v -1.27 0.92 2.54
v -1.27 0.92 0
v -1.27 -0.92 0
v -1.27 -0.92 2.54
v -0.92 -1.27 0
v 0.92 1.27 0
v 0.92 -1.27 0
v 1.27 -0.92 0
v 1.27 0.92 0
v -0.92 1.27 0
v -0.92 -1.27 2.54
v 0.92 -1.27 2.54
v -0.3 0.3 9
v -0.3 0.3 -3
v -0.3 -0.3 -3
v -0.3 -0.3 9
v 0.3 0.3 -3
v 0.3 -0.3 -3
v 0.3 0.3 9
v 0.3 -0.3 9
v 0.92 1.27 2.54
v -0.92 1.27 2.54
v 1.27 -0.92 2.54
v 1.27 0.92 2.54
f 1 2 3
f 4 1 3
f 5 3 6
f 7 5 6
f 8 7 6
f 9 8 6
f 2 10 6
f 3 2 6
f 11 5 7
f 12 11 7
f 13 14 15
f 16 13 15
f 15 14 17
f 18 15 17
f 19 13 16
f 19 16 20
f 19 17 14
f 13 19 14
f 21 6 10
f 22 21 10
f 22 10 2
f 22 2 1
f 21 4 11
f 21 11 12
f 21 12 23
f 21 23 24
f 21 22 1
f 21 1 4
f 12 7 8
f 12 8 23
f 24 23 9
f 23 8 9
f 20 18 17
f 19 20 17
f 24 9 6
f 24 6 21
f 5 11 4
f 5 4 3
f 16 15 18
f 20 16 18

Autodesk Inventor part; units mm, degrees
ref_plane "YZ Plane" through (0, 0, 0) normal (1, 0, 0) x (0, 1, 0)
ref_plane "XZ Plane" through (0, 0, 0) normal (0, 1, 0) x (-1, 0, 0)
ref_plane "XY Plane" through (0, 0, 0) normal (0, 0, 1) x (1, 0, 0)
sketch "Skizze1" plane through (0, 0, 0) normal (0, 0, 1) x (1, 0, 0)
  line L0 (-1.27, -1.27) -> (1.27, -1.27)
  line L1 (1.27, -1.27) -> (1.27, 1.27)
  line L2 (1.27, 1.27) -> (-1.27, 1.27)
  line L3 (-1.27, 1.27) -> (-1.27, -1.27)
  line L4 (-1.27, -1.27) -> (1.27, 1.27) construction
  line L5 (1.27, -1.27) -> (-1.27, 1.27) construction
  point P0 (0, 0)
  dimension "d0" = 2.54
  dimension "d1" = 2.54
extrude "Extrusion1" add sketch "Skizze1" along normal blind 2.54
chamfer "Fase1" distance 0.35 angle 45 4 edges at (1.27, -1.27, 1.27) (-1.27, -1.27, 1.27) (-1.27, 1.27, 1.27) (1.27, 1.27, 1.27)
sketch "Skizze2" plane through (0, 0, 0) normal (0, 0, 1) x (1, 0, 0)
  line L0 (-0.3, -0.3) -> (0.3, -0.3)
  line L1 (0.3, -0.3) -> (0.3, 0.3)
  line L2 (0.3, 0.3) -> (-0.3, 0.3)
  line L3 (-0.3, 0.3) -> (-0.3, -0.3)
  line L4 (-0.3, -0.3) -> (0.3, 0.3) construction
  line L5 (0.3, -0.3) -> (-0.3, 0.3) construction
  point P0 (0, 0)
  dimension "d7" = 0.6
  dimension "d8" = 0.6
extrude "Extrusion2" add sketch "Skizze2" along normal blind 9 and the other way blind 3 separate body
properties part number "Pin"
